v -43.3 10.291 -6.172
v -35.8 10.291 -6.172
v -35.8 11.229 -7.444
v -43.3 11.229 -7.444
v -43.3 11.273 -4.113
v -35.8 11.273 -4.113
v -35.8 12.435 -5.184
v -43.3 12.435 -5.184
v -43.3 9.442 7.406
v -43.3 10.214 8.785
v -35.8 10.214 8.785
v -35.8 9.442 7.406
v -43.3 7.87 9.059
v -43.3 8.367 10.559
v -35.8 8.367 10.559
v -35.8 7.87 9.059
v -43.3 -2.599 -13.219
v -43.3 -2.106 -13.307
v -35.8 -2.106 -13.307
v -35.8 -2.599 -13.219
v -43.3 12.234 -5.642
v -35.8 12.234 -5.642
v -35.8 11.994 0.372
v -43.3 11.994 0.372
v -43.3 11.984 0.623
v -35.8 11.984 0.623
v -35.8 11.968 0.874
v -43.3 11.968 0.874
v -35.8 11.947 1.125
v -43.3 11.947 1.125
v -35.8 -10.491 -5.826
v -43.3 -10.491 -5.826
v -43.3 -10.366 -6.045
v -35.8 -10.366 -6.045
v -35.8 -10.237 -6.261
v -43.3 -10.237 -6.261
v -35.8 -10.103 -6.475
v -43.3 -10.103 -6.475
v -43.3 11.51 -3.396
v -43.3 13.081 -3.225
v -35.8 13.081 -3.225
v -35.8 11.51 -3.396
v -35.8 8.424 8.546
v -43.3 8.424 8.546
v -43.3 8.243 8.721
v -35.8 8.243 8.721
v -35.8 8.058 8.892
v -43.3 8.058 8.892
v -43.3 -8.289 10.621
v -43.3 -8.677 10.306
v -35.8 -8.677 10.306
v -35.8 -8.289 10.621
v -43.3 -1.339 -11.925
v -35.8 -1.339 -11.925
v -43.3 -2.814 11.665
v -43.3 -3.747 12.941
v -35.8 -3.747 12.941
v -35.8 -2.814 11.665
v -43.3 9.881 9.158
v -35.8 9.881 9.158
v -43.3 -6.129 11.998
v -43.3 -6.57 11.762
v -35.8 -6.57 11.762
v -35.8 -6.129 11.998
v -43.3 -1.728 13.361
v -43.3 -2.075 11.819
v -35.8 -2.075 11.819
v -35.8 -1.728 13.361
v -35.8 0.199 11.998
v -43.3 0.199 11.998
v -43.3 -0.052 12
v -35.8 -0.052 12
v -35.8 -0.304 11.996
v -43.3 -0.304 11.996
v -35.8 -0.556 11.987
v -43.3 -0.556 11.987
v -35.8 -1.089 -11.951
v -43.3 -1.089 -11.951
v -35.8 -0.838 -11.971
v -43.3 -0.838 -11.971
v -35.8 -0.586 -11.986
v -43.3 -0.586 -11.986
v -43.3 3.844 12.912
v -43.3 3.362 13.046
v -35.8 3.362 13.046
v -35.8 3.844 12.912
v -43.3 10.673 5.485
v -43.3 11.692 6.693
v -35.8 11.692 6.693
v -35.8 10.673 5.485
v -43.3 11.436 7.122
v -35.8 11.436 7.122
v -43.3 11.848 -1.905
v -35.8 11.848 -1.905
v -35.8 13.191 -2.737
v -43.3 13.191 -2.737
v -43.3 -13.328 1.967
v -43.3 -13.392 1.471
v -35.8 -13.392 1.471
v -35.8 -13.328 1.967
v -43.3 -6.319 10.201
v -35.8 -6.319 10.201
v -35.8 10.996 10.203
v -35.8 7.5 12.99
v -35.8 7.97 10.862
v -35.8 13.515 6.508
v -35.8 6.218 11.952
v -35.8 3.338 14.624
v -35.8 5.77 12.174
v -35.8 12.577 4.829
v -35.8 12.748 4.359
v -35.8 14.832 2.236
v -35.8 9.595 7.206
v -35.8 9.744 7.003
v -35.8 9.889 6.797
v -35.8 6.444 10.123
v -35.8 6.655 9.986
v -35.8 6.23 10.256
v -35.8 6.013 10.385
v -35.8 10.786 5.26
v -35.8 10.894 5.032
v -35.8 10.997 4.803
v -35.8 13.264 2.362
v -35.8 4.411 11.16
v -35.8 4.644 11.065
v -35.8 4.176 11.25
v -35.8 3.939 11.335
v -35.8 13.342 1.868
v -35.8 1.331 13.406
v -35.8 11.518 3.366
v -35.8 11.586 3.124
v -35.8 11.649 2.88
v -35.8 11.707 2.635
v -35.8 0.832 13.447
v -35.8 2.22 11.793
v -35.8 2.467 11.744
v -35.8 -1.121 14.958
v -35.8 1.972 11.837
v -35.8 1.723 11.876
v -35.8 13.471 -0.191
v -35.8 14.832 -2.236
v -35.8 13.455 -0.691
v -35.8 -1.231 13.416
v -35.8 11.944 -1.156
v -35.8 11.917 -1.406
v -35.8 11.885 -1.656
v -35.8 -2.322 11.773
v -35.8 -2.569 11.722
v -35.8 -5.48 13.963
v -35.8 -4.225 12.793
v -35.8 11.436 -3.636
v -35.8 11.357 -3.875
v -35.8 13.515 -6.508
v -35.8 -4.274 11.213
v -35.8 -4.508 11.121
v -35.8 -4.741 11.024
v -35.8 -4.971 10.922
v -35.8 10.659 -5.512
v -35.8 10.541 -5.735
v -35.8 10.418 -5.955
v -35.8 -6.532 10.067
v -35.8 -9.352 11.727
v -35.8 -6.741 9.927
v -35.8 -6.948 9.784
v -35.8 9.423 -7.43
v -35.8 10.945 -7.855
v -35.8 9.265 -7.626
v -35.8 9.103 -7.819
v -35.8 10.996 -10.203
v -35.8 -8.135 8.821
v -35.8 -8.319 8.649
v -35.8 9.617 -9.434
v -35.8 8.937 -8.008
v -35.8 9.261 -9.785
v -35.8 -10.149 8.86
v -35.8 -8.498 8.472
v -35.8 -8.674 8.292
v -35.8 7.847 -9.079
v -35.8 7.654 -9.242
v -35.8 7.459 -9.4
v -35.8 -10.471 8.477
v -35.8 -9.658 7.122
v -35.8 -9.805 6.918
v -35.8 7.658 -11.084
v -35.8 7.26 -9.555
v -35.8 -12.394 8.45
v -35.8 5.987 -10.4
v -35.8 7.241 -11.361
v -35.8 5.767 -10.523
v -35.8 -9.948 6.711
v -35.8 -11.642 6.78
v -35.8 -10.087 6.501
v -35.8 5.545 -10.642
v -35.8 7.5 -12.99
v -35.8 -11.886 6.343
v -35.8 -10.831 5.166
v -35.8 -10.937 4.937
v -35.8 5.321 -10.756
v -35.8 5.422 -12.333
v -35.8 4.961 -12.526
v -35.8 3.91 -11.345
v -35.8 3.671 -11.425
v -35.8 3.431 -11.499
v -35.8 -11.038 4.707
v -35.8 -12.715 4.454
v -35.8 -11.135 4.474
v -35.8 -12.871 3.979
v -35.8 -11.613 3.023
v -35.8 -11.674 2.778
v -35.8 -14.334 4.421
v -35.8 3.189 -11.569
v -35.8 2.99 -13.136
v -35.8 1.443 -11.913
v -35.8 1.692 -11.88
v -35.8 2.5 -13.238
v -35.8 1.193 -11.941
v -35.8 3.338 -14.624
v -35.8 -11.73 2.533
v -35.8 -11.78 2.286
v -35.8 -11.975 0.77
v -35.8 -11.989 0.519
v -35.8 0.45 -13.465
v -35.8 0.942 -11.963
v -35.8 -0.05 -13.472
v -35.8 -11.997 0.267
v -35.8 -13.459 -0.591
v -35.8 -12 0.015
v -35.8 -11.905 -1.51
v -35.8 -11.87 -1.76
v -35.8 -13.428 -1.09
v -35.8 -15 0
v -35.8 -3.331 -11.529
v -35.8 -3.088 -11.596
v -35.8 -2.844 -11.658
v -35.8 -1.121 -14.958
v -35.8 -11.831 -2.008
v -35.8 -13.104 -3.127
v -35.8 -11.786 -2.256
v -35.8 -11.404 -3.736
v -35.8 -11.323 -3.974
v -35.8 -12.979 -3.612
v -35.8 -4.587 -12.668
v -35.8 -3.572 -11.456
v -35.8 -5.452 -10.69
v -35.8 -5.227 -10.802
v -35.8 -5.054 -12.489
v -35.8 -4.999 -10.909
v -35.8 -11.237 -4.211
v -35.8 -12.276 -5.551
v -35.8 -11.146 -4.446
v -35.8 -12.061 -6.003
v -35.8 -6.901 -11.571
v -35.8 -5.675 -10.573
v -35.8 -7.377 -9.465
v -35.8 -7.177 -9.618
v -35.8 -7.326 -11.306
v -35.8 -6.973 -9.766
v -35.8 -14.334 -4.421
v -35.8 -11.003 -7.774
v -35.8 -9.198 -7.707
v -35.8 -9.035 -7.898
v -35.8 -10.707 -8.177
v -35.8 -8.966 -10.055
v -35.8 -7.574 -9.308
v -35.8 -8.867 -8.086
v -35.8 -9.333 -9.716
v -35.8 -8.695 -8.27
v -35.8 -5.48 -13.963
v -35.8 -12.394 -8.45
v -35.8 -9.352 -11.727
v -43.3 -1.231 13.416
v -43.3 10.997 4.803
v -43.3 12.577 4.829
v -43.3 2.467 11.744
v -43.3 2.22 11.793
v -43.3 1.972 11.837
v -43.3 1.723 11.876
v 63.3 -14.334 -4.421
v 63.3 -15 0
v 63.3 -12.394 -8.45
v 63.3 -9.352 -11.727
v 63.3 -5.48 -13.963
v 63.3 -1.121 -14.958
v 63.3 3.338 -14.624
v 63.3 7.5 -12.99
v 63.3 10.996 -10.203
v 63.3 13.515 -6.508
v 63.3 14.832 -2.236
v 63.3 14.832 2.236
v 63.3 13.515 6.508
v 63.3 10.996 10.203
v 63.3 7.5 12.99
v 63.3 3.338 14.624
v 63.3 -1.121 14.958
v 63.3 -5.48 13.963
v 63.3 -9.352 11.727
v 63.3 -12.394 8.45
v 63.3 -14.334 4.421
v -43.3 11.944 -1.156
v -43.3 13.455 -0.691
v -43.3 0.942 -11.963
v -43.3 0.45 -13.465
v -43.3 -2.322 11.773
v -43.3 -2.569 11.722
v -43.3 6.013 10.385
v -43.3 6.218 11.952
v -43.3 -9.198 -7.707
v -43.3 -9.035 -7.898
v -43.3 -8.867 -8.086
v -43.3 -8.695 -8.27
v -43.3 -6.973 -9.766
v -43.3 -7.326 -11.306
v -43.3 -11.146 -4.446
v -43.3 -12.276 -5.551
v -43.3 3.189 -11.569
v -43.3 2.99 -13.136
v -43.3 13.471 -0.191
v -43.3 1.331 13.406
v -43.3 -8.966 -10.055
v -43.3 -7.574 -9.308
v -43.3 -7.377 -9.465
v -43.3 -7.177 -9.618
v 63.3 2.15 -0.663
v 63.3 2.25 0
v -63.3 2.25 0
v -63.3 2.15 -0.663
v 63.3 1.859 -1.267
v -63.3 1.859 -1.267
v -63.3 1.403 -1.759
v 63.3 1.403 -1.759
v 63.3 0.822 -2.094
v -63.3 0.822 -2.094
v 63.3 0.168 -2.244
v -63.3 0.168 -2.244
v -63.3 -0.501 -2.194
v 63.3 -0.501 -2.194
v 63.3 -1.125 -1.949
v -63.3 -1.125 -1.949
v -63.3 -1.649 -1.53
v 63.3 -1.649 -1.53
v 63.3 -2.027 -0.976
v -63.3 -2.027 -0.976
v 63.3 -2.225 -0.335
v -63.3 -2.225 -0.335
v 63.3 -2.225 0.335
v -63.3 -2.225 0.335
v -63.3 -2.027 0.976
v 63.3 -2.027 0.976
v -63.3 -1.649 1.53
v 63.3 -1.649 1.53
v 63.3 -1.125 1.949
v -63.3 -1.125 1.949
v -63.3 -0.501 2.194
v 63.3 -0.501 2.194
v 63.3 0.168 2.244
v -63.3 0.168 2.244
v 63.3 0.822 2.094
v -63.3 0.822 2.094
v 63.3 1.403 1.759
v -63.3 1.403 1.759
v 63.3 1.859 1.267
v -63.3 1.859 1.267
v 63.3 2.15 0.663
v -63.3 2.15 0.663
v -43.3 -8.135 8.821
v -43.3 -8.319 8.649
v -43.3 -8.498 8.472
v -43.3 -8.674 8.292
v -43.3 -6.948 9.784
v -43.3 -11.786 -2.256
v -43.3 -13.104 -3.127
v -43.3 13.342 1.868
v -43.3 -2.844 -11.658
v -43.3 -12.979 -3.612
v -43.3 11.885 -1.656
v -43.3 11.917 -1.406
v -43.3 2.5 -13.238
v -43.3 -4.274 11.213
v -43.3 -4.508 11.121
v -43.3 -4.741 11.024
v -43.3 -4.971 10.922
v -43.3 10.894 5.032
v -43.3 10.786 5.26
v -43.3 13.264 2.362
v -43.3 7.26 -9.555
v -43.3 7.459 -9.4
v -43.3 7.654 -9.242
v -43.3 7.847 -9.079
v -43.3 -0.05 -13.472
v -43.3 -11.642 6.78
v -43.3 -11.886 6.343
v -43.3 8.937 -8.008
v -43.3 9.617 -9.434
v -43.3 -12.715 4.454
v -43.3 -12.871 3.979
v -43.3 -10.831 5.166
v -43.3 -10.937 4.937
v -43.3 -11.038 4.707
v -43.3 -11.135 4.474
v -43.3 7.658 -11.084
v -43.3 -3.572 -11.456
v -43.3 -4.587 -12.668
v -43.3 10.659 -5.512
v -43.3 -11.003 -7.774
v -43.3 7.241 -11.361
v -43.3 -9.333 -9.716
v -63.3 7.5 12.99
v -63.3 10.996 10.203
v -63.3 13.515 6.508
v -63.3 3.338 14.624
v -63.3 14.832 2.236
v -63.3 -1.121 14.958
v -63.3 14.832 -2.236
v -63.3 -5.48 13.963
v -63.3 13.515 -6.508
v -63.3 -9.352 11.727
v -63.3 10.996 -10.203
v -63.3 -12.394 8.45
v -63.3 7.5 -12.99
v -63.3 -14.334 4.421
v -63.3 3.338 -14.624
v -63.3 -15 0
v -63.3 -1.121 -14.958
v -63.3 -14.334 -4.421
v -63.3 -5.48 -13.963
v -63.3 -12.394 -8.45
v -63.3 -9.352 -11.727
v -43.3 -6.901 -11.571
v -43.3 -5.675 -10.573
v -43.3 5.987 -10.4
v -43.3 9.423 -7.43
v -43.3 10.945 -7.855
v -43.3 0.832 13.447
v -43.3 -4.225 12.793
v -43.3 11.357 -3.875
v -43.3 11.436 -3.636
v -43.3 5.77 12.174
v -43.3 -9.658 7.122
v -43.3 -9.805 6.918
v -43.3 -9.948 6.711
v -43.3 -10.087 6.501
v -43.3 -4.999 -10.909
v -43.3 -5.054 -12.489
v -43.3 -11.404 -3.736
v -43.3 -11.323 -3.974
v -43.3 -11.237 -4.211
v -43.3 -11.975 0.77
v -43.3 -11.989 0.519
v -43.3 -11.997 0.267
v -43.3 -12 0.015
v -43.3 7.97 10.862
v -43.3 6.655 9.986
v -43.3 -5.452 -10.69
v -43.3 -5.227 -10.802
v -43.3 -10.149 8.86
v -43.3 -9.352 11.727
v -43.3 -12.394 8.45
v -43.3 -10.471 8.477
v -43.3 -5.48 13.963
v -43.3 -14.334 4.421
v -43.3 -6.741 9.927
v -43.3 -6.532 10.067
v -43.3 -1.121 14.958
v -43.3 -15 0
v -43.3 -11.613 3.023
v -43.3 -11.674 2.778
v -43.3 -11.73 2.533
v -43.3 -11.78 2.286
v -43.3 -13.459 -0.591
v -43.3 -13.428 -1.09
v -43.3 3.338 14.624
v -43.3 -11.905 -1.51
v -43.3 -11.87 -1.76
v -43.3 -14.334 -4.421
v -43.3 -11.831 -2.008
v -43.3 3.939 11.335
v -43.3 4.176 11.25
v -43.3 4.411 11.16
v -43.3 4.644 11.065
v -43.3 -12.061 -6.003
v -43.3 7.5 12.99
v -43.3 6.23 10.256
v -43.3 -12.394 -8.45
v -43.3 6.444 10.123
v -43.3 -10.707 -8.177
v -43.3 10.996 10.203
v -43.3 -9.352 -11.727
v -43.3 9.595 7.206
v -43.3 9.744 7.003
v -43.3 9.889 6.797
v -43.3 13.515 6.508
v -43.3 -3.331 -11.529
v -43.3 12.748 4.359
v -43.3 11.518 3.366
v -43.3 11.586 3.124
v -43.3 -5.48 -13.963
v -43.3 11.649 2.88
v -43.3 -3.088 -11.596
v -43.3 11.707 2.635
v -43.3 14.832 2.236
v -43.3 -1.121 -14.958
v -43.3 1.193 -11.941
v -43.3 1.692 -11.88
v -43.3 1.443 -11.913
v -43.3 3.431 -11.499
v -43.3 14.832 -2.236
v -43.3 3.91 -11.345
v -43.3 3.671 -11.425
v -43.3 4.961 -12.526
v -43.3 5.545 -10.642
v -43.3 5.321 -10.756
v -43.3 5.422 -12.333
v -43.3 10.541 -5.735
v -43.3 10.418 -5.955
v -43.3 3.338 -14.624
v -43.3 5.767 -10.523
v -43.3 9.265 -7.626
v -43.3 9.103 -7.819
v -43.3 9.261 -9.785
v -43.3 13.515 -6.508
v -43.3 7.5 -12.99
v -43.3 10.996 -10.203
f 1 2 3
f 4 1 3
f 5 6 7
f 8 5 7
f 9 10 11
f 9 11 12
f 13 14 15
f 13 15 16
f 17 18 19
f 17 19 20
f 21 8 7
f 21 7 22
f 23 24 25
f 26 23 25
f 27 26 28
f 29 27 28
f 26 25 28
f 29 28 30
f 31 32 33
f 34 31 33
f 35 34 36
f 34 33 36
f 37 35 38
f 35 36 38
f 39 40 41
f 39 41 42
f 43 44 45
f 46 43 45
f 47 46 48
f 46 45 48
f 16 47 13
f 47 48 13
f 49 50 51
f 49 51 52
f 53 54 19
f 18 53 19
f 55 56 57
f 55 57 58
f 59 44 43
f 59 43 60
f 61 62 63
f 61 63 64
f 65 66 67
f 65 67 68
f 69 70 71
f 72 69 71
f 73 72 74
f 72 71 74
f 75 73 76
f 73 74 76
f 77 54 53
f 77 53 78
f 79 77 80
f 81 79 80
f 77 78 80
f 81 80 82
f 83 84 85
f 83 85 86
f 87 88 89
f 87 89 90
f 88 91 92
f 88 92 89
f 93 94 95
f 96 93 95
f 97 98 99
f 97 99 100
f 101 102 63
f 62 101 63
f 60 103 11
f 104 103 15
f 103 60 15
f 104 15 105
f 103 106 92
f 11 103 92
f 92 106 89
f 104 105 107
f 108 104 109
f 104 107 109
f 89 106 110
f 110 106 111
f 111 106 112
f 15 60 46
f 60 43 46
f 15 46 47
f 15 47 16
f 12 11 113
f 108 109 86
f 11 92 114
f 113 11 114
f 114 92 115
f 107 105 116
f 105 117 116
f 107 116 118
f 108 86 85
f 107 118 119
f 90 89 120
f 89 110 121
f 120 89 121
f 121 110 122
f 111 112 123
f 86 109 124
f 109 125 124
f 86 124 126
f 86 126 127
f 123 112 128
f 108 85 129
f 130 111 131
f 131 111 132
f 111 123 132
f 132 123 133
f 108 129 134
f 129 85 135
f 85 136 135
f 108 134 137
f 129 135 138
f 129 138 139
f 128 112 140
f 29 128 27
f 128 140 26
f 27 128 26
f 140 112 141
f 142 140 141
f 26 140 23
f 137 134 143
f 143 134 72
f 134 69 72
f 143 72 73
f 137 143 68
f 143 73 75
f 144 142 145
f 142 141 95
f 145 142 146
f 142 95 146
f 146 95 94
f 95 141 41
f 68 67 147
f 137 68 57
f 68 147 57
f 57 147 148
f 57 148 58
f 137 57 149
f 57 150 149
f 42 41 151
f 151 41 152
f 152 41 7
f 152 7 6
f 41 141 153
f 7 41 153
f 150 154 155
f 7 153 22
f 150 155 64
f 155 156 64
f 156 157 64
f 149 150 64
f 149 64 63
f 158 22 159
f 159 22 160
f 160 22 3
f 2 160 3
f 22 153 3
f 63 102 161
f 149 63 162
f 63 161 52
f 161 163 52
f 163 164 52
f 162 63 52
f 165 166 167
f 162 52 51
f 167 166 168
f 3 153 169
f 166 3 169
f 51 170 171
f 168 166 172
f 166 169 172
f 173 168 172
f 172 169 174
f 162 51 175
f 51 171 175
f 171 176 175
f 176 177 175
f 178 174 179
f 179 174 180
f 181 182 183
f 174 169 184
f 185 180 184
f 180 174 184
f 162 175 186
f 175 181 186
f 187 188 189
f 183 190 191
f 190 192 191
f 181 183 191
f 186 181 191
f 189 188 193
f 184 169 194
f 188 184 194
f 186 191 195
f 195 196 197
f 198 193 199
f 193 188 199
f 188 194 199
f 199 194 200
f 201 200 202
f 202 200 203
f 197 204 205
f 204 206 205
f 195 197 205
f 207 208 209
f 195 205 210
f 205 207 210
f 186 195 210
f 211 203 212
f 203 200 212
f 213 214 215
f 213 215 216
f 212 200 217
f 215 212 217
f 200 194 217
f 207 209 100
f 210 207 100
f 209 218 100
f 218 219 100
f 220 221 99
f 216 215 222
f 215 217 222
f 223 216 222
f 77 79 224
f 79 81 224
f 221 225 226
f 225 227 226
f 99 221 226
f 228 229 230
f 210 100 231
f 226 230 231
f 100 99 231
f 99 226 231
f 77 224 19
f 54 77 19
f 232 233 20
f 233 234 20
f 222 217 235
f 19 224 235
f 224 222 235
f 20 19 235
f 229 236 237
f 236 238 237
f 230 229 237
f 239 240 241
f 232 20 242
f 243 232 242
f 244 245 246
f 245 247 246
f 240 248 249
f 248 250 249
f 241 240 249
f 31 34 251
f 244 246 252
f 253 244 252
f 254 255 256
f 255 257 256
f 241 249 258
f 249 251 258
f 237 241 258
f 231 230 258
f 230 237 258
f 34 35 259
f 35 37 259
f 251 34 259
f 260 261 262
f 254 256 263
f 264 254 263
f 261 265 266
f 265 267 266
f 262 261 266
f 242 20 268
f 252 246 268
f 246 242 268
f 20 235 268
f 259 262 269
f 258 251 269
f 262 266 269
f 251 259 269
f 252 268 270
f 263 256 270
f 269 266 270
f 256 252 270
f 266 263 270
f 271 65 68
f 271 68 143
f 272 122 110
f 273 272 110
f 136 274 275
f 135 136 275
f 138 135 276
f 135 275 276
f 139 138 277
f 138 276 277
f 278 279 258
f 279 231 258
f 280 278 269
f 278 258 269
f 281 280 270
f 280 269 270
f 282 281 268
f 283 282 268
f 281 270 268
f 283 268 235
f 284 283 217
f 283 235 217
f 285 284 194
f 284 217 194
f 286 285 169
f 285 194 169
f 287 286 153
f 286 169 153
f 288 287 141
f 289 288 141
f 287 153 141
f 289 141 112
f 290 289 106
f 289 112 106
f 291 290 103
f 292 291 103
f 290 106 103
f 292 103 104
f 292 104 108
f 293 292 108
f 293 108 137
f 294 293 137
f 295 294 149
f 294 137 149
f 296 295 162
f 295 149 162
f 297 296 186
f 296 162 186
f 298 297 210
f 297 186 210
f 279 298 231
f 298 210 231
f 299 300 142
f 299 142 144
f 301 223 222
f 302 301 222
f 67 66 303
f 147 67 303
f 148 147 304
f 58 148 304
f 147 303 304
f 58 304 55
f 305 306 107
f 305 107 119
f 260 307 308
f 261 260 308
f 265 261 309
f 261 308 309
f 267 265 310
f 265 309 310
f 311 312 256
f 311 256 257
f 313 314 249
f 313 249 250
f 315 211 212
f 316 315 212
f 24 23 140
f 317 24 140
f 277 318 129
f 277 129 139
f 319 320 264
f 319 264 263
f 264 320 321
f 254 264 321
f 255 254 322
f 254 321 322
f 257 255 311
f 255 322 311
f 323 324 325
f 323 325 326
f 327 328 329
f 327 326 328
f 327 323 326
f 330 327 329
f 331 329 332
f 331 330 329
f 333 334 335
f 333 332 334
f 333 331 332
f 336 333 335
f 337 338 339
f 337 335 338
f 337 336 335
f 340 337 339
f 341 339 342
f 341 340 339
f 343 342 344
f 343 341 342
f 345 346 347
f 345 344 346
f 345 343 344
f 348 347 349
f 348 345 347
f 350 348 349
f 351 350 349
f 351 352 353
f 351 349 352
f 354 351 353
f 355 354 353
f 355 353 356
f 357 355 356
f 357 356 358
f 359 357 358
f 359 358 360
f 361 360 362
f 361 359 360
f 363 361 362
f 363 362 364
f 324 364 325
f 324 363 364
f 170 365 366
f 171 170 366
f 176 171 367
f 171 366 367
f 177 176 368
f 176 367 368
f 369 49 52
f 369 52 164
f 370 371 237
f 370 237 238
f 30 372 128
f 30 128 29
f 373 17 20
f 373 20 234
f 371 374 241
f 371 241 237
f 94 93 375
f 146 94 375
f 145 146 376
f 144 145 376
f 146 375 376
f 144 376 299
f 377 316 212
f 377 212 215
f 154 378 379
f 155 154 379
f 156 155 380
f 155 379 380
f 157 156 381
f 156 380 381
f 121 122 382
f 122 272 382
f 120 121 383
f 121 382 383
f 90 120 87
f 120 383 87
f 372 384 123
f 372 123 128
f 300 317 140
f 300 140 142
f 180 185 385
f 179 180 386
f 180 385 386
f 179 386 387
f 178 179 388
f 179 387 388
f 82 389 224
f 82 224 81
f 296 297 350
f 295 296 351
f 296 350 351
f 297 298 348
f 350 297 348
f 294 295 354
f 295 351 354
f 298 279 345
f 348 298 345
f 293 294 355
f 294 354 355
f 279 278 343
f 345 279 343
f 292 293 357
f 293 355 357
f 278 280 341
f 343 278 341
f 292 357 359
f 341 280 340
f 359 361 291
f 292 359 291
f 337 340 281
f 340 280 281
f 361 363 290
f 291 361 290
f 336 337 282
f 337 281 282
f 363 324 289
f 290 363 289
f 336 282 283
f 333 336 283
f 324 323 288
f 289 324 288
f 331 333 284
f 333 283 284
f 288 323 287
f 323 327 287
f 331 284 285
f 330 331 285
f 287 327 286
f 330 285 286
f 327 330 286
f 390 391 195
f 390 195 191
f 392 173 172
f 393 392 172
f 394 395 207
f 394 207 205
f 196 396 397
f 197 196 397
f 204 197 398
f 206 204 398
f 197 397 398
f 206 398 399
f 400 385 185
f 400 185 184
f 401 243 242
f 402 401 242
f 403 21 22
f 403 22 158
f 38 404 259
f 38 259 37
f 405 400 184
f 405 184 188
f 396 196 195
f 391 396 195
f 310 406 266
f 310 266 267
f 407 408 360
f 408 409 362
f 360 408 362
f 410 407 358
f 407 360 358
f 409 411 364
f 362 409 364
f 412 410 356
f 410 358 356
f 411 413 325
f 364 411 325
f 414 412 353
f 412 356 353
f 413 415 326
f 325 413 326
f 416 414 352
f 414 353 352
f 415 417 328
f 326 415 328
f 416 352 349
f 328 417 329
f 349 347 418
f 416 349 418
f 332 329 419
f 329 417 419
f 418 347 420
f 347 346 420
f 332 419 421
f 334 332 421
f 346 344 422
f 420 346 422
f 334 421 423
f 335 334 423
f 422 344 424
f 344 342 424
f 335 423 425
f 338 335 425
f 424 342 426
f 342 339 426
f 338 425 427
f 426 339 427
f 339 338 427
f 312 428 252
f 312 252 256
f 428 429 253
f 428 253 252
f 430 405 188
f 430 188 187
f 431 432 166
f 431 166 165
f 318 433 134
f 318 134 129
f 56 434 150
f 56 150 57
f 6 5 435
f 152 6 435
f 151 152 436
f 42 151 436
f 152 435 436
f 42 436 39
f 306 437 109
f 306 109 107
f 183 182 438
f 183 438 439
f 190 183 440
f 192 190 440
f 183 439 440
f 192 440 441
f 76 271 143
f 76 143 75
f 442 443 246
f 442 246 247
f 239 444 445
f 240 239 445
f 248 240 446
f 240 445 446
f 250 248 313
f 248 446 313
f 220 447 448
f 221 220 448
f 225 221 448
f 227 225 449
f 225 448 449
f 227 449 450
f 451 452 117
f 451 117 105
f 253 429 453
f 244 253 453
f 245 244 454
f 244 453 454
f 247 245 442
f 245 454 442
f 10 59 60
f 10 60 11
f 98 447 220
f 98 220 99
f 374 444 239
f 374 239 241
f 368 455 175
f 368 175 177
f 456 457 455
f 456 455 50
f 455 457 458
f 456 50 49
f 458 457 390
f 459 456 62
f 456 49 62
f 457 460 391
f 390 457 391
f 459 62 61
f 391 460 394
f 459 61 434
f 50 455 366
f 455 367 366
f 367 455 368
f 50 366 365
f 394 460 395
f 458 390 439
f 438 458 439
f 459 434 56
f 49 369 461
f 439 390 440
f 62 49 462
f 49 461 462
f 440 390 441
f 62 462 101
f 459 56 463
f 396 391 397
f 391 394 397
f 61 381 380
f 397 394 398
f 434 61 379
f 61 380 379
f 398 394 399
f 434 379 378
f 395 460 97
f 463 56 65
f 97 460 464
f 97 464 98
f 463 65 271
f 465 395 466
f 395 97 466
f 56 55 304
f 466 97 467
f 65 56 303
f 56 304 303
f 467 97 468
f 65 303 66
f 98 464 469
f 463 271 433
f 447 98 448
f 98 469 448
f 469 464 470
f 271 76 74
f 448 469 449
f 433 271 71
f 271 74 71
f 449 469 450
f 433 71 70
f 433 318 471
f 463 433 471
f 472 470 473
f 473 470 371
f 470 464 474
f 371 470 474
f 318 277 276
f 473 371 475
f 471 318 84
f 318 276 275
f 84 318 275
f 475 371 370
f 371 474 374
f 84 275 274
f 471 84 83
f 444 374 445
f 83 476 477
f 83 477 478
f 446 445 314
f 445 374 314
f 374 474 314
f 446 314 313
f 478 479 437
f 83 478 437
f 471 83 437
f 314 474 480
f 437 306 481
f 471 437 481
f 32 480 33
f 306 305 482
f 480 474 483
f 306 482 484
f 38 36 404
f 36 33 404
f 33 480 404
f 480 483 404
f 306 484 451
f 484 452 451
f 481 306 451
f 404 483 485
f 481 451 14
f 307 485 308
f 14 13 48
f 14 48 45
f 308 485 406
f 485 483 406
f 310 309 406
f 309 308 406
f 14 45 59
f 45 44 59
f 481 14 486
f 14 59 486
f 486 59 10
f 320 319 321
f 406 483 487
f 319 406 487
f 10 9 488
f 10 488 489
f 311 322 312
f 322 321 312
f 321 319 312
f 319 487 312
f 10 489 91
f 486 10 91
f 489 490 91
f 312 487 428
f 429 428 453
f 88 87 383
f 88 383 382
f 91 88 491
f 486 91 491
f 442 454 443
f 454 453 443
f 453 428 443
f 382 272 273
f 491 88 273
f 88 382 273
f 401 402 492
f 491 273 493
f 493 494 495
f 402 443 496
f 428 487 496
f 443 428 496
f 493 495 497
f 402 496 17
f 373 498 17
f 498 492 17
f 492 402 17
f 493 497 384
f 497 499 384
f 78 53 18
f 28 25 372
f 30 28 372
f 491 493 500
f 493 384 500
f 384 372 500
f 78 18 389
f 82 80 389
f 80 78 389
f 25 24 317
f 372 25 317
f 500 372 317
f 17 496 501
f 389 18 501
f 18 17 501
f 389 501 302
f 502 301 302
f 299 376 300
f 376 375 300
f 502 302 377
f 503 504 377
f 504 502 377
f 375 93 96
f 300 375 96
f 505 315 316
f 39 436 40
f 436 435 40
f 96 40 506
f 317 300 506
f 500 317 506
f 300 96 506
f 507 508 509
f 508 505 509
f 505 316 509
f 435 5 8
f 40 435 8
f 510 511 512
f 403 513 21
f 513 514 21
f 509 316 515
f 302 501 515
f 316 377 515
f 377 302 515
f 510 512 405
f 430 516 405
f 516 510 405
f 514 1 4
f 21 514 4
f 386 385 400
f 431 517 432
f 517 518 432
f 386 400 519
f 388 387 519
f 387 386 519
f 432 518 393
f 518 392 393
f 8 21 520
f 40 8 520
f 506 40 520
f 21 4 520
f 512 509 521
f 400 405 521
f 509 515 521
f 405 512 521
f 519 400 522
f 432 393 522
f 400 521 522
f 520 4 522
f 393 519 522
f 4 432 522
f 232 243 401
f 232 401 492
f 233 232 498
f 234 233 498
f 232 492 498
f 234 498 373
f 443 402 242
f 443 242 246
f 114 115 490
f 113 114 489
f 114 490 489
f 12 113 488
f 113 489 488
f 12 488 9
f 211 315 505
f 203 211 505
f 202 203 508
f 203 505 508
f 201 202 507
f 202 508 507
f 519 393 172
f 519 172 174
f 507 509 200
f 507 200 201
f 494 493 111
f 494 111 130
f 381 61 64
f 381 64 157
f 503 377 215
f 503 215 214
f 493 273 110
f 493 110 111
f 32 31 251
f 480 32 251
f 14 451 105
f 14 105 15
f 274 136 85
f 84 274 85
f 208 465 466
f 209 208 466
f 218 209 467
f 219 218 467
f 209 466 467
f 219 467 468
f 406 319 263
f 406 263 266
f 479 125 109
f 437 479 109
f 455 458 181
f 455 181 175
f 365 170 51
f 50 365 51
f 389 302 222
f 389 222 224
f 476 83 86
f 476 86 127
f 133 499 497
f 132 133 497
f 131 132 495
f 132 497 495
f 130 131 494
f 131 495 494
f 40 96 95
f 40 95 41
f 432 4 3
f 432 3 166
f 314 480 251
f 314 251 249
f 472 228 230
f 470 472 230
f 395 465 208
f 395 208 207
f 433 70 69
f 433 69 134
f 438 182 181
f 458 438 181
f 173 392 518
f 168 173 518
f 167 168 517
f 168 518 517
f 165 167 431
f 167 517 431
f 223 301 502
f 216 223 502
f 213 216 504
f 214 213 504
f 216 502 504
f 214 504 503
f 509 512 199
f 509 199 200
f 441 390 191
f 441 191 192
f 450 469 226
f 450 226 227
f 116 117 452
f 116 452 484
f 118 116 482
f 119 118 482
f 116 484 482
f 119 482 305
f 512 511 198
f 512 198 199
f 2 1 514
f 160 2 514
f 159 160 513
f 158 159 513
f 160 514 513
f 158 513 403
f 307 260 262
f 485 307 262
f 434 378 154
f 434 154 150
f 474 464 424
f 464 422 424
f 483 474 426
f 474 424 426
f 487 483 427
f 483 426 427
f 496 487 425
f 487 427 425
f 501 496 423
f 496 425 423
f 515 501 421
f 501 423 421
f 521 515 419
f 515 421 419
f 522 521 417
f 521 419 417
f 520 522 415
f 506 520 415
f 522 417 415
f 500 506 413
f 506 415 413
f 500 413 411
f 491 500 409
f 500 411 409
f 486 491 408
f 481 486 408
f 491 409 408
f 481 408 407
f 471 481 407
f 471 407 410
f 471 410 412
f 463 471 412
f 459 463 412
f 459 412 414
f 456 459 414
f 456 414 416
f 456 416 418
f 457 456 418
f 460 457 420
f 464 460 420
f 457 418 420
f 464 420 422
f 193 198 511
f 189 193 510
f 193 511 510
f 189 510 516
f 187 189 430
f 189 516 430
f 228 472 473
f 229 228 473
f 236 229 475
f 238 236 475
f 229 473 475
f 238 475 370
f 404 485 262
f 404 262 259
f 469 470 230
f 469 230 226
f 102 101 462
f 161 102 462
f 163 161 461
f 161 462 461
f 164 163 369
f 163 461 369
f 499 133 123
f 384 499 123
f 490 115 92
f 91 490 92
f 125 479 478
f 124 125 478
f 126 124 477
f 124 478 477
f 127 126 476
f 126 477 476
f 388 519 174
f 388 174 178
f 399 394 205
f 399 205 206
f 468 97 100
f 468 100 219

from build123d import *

# Parameters (mm, degrees)
BOSS_EXTRU_1_DEPTH           = 7.5
R_P_TITION_CIRCULAIRE1_COUNT = 33
ENL_V_MAT_EXTRU_3_DEPTH      = 129.364948487
ENL_V_MAT_EXTRU_3_DEPTH_BACK = 129.364948487
ESQUISSE7_R                  = 2.25


with BuildPart() as part:
    # Esquisse1 → Révolution1 (revolve)
    with BuildSketch(Plane.XY, mode=Mode.PRIVATE) as r_volution1_sk:
        Polygon((-63.3, 15), (-63.3, 0), (63.3, 0), (63.3, 15), (-35.8, 15), (-35.8, 12), (-43.3, 12), (-43.3, 15), align=None)
    revolve(r_volution1_sk.sketch.rotate(Axis((-63.3, 0, 0), (1, 0, 0)), 180), axis=Axis((-63.3, 0, 0), (1, 0, 0)))

    # Esquisse3 → Boss.-Extru.1 (add)
    with BuildSketch(Plane(origin=(-43.3, 0, 0), x_dir=(0, 0, -1), z_dir=(1, 0, 0))):
        Polygon((0.691111458, 13.454530338), (1.369204766, 11.251751142), (-0.629722527, 11.317246794), (0.191111458, 13.470913037), align=None)
    boss_extru_1 = extrude(amount=BOSS_EXTRU_1_DEPTH)

    # Répétition circulaire1: Boss.-Extru.1 ×33 about axis
    r_p_tition_circulaire1_axis = Axis((0, 0, 0), (1, 0, 0))
    for i in range(1, R_P_TITION_CIRCULAIRE1_COUNT):
        add(boss_extru_1.rotate(r_p_tition_circulaire1_axis, i * 360 / R_P_TITION_CIRCULAIRE1_COUNT))

    # Esquisse7 → Enlèv. mat.-Extru.3 (cut, two sides: drawn at the far end of the back side and taken through both)
    with BuildSketch(Plane.ZY.offset(63.3).offset(-ENL_V_MAT_EXTRU_3_DEPTH_BACK)):
        with Locations(Location((0, 0, 0), (0, 0, 90))):
            Circle(ESQUISSE7_R)
    extrude(amount=ENL_V_MAT_EXTRU_3_DEPTH + ENL_V_MAT_EXTRU_3_DEPTH_BACK, mode=Mode.SUBTRACT)


solid = part.part
